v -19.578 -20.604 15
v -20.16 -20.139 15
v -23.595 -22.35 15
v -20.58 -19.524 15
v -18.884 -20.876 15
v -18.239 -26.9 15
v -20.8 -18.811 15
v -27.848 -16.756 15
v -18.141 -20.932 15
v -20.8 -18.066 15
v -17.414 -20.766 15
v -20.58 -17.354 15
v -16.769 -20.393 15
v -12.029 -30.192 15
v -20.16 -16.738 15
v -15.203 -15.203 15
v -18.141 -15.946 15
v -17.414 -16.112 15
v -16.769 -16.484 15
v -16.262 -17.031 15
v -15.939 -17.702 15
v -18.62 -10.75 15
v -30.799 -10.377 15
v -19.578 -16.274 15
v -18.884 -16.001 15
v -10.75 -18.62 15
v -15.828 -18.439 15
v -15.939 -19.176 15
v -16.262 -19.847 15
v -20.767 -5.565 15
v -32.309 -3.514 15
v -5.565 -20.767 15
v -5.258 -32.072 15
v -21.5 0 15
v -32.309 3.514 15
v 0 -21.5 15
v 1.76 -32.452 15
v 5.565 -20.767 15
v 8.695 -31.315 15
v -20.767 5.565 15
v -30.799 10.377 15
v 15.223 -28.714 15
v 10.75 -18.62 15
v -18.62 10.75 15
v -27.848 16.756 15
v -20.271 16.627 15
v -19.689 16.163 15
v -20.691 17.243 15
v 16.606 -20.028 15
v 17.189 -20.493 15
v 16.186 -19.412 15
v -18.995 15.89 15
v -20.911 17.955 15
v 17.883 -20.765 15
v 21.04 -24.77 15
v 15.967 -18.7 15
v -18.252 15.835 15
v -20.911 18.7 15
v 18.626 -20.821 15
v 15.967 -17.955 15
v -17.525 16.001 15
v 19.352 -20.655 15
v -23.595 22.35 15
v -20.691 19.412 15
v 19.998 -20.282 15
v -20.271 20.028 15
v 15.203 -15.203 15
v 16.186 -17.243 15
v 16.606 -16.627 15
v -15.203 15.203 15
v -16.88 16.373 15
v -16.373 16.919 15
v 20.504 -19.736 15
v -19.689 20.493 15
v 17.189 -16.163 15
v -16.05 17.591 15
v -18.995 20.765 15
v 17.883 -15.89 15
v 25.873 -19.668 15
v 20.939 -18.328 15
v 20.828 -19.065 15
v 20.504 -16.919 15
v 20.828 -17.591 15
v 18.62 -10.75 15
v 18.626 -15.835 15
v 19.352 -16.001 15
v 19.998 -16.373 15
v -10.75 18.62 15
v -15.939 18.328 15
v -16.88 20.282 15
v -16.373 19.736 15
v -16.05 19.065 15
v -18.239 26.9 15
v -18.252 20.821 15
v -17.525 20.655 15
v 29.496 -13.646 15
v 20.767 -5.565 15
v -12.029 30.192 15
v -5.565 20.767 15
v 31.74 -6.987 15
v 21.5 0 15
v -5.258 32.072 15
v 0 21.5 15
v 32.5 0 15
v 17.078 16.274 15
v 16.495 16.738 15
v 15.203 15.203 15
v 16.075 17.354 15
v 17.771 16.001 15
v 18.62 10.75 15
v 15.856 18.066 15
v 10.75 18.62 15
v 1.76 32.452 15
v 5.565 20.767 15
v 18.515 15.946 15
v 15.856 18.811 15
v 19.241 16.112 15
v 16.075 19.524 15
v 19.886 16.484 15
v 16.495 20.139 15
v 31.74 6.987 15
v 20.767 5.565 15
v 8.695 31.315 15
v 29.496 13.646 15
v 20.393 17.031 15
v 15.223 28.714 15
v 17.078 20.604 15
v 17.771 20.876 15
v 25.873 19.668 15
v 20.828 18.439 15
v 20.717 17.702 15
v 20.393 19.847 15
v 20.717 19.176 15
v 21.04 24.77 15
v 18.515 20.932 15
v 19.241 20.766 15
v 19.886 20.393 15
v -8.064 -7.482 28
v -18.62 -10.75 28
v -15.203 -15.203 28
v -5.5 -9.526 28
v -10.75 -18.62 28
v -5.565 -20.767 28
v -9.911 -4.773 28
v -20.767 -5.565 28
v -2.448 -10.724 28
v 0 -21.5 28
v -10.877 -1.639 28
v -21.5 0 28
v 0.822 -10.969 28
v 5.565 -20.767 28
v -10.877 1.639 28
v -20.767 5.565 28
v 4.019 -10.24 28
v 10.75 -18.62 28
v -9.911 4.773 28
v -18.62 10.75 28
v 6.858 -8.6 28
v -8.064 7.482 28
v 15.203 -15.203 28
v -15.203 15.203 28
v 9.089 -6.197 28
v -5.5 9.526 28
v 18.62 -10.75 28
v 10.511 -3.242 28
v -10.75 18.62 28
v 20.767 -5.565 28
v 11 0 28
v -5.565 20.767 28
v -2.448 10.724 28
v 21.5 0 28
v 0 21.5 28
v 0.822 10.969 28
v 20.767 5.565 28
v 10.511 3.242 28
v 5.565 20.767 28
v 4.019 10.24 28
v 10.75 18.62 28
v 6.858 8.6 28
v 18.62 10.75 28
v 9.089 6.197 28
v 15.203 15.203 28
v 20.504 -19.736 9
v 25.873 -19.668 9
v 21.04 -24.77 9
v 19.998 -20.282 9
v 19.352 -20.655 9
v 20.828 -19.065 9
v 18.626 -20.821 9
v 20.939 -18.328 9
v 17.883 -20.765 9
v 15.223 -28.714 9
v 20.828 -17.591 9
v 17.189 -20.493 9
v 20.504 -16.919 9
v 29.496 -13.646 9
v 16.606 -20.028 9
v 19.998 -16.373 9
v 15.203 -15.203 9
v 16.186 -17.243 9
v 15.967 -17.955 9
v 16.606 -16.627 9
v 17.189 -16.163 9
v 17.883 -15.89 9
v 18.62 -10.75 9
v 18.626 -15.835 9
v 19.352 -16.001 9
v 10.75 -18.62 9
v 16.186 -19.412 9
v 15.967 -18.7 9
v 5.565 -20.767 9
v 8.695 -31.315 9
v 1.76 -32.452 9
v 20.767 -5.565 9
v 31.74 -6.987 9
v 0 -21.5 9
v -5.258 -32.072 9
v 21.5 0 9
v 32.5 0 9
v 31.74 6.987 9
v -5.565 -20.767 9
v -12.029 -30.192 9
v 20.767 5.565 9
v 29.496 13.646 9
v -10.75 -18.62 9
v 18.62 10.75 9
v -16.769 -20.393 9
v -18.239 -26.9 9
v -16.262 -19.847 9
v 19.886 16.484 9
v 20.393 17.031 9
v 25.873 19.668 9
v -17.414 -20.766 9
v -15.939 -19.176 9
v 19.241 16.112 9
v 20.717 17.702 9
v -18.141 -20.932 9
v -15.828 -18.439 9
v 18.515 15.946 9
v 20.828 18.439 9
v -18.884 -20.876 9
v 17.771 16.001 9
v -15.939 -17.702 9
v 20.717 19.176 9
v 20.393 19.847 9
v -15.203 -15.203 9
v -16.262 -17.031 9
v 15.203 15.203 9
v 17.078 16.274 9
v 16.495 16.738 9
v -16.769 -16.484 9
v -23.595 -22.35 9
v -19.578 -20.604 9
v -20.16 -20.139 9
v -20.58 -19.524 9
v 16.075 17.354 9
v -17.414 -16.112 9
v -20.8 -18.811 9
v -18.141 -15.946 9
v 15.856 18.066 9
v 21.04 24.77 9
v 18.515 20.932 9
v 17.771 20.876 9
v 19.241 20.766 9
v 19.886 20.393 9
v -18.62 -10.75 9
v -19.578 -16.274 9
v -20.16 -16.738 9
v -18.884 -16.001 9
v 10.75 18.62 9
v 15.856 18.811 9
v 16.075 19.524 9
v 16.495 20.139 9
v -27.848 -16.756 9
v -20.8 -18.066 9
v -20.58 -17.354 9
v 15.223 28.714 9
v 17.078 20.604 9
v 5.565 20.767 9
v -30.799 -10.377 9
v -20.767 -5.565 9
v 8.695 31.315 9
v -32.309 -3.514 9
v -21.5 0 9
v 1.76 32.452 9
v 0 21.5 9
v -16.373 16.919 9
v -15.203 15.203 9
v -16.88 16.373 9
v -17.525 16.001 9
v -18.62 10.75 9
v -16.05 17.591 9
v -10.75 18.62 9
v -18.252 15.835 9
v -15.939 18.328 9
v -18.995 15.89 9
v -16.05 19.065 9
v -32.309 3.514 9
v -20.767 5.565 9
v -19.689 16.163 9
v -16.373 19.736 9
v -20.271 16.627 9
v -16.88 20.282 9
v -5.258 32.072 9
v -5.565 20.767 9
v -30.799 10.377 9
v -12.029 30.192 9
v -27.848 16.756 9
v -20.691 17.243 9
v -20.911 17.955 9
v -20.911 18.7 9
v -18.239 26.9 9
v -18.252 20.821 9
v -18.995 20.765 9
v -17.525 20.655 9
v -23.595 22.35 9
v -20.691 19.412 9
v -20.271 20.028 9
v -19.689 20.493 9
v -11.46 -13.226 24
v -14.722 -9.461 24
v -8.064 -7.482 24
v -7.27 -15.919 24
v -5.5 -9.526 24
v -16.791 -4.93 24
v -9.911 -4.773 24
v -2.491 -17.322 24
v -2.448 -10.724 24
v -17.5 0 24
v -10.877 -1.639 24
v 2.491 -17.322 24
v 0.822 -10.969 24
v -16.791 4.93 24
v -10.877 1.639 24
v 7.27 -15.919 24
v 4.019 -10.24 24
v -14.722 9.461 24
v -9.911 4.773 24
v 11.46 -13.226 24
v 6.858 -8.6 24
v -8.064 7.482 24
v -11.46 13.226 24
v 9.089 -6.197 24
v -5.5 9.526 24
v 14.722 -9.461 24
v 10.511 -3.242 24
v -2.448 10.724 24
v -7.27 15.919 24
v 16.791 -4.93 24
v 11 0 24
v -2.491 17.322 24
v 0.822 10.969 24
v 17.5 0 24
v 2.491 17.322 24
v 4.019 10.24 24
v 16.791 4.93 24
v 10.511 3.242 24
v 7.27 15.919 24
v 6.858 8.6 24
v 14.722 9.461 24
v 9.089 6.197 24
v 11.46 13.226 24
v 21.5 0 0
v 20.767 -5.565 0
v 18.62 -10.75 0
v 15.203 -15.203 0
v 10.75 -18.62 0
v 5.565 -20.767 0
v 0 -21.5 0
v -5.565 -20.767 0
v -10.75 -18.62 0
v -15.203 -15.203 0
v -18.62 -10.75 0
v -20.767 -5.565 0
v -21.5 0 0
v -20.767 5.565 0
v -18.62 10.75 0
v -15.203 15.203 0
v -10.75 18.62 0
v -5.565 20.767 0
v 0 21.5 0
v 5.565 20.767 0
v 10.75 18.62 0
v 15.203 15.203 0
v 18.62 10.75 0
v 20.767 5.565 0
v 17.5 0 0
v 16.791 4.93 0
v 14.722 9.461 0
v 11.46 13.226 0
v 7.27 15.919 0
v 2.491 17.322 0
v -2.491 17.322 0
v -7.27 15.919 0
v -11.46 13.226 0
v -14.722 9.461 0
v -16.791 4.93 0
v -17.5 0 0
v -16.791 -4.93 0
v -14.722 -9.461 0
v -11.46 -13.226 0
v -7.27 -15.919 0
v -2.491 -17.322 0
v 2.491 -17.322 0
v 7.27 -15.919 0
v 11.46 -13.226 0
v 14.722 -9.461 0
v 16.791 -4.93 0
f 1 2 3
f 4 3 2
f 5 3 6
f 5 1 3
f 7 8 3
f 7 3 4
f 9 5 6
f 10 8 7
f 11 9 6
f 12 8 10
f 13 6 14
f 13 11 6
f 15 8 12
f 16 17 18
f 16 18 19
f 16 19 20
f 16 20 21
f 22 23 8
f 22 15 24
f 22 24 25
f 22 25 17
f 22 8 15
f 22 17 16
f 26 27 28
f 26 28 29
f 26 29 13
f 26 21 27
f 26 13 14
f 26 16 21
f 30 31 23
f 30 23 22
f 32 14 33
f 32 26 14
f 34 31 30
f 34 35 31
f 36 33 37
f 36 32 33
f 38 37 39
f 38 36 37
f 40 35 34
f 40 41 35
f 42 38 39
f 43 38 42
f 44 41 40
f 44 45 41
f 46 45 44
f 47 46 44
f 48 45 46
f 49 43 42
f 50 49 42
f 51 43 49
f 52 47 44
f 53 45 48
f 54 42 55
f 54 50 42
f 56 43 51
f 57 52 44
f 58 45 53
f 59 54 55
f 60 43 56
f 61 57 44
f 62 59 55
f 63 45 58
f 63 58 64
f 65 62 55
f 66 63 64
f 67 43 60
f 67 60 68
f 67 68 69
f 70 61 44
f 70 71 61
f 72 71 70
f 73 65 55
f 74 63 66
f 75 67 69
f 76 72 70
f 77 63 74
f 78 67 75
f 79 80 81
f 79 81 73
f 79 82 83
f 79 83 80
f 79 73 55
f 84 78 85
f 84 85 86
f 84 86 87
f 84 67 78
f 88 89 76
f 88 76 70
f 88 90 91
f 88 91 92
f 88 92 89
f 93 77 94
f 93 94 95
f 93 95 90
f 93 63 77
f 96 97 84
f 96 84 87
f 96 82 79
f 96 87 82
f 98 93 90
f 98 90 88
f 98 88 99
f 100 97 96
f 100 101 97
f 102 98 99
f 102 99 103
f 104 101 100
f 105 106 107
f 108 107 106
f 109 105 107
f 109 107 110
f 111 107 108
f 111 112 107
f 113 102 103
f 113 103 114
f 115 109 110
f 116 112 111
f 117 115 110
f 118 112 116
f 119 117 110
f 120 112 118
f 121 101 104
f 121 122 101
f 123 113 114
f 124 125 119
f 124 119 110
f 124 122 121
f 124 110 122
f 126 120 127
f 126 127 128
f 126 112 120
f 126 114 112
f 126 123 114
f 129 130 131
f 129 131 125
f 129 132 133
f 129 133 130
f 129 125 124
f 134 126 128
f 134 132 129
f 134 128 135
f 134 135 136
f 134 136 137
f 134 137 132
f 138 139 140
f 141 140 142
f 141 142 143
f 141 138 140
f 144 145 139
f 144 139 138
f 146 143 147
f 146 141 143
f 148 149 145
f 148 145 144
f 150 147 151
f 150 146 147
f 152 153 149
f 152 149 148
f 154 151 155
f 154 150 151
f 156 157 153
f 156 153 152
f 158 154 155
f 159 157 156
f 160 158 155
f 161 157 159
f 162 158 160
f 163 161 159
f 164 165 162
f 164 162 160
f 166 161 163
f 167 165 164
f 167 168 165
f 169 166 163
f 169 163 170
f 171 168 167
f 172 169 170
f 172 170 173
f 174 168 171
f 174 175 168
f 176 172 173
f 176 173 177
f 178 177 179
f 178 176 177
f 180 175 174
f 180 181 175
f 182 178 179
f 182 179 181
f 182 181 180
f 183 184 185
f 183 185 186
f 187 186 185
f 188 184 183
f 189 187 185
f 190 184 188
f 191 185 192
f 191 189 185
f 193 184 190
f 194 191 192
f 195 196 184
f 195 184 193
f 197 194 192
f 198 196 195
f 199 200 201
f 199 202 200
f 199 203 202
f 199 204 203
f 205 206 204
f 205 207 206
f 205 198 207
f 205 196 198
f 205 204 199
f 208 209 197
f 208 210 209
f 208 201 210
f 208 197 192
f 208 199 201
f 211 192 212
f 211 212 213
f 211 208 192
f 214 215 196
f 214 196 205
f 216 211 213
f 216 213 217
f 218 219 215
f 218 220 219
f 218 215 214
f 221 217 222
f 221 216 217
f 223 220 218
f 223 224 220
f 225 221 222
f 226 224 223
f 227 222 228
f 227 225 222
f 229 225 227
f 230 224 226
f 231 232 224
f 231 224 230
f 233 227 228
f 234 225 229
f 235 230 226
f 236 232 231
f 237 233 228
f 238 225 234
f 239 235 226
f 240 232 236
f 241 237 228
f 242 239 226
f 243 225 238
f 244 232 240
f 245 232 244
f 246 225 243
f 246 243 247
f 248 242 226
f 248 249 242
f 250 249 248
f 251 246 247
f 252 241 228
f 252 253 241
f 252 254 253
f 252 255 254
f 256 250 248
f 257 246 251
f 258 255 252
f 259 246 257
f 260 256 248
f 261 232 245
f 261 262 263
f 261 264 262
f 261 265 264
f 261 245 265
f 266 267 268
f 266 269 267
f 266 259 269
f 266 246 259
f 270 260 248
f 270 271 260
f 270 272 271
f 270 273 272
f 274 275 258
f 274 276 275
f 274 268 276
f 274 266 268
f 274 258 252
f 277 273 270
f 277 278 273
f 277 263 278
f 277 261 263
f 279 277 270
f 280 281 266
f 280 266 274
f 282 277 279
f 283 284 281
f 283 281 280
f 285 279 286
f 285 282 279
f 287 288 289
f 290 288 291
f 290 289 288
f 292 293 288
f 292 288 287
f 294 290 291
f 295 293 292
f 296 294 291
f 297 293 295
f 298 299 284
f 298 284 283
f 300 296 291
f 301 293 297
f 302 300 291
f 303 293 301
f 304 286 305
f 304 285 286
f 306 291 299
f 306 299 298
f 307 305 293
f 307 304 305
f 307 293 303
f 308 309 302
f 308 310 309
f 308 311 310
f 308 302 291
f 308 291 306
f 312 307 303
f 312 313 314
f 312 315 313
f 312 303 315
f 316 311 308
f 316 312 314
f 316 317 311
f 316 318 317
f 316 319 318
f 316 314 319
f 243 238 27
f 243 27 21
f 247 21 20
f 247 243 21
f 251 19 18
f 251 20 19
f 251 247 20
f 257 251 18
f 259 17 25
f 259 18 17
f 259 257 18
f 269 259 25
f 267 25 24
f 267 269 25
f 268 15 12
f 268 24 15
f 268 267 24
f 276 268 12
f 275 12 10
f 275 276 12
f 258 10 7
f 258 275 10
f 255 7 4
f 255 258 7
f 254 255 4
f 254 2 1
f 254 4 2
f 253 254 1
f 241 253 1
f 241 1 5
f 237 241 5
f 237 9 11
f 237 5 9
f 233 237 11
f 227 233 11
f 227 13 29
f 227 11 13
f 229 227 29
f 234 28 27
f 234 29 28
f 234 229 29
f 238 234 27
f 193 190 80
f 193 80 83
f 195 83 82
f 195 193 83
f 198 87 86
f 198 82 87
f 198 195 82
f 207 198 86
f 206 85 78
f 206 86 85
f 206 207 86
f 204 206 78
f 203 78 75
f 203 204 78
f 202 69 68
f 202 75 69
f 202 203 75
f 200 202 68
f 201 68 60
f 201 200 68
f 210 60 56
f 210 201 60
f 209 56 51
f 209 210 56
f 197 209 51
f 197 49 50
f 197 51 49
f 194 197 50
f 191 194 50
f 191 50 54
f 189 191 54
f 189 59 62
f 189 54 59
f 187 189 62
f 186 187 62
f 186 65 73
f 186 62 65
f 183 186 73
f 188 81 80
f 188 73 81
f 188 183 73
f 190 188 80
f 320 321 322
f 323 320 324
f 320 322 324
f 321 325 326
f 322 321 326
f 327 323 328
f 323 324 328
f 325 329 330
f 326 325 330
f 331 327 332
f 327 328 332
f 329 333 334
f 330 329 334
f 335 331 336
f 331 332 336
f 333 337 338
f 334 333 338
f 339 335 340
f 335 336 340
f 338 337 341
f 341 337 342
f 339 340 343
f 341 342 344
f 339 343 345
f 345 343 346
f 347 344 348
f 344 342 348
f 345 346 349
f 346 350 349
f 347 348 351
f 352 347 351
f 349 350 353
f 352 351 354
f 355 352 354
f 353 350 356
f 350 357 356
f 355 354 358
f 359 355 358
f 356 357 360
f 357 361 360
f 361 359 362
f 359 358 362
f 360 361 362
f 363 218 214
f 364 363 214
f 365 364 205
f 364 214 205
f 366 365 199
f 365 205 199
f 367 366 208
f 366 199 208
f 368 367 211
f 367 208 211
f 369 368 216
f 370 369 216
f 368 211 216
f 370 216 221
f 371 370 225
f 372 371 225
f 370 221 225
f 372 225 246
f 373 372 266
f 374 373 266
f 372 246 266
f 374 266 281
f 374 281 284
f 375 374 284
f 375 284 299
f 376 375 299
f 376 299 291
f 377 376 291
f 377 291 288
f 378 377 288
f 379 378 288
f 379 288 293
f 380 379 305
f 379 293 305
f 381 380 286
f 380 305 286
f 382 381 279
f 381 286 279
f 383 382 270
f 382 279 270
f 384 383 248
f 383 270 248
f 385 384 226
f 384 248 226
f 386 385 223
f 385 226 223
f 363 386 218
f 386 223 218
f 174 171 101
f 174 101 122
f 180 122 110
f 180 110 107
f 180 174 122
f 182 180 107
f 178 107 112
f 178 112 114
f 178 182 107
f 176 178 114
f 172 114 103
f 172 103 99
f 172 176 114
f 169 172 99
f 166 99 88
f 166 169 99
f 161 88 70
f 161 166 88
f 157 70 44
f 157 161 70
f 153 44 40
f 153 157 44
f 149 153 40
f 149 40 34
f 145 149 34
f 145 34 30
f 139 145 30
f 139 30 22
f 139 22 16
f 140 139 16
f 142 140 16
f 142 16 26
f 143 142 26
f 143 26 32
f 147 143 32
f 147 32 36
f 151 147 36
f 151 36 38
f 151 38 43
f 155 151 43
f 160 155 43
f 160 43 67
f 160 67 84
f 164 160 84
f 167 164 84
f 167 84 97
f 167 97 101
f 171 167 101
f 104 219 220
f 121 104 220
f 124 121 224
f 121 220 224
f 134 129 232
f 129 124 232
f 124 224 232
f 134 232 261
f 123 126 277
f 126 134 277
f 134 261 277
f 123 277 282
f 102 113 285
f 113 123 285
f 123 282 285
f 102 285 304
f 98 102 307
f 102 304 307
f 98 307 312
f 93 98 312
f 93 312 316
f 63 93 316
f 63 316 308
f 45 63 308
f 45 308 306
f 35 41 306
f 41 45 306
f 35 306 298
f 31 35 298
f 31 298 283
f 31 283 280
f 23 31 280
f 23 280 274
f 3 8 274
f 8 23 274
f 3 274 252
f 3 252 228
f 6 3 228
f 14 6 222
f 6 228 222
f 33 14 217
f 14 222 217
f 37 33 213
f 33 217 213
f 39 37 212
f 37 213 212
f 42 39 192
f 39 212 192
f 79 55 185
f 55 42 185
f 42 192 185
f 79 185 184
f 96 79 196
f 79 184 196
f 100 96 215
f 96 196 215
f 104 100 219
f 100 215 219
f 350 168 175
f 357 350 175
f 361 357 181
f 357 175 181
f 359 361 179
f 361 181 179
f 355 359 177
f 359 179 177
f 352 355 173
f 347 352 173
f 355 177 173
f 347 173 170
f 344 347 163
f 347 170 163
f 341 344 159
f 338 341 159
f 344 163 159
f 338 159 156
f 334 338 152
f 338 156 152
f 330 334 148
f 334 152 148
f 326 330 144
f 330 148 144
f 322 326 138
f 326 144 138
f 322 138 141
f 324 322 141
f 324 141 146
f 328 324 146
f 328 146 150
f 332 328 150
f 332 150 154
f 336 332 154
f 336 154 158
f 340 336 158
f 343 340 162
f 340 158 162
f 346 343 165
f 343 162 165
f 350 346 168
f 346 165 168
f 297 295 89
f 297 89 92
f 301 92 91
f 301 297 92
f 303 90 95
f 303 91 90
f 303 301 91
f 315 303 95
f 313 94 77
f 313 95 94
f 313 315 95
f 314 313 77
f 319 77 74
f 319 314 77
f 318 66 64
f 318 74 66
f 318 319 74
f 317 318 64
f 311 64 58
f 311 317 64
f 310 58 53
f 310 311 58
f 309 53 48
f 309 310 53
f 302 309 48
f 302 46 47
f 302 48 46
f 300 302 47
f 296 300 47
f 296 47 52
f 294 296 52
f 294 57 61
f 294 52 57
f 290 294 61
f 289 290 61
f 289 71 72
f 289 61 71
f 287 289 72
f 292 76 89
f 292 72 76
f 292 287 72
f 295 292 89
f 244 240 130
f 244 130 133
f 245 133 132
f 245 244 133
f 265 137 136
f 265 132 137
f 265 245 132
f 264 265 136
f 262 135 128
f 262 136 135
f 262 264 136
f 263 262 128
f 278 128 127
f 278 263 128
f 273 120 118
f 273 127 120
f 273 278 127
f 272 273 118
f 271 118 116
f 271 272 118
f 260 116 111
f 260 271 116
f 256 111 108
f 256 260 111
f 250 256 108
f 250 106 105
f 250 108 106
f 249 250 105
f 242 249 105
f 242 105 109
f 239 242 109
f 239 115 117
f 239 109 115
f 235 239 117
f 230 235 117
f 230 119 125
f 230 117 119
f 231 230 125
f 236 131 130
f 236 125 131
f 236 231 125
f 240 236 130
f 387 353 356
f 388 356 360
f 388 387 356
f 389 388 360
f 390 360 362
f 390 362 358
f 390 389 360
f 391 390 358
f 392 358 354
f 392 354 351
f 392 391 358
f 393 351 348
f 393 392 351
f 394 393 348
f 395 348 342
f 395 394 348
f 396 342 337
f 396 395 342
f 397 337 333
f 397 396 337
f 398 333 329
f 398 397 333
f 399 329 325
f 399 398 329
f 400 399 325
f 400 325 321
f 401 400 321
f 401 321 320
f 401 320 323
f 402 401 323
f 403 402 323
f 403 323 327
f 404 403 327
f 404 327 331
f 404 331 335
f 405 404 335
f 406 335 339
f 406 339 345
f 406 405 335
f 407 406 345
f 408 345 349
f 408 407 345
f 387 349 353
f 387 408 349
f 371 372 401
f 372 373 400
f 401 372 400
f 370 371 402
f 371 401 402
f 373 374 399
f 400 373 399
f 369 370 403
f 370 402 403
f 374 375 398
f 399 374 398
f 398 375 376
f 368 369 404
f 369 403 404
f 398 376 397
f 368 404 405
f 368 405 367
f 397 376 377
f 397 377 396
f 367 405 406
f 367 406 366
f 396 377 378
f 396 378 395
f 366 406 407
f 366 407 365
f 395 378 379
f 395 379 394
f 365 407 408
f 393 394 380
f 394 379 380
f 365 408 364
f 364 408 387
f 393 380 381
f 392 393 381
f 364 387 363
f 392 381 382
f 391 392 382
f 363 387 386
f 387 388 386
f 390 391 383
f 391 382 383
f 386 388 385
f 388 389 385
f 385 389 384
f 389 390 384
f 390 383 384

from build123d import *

# Parameters (mm, degrees)
SKETCH_1_R          = 32.5
SKETCH_1_R_2        = 17.5
SKETCH_1_R_3        = 2.5
EXTRUDE_1_DEPTH     = 24
SKETCH_2_R          = 35
SKETCH_2_R_2        = 21.5
CUT_EXTRUDE_2_DEPTH = 9
CUT_EXTRUDE_START   = -9
SKETCH_3_R          = 35
SKETCH_3_R_2        = 21.5
CUT_EXTRUDE_3_DEPTH = 9
EXTRUDE_START       = 4
SKETCH_4_R          = 21.5
SKETCH_4_R_2        = 11
EXTRUDE_4_DEPTH     = 4


with BuildPart() as part:
    # Эскиз1 → Вытянуть1 (new body)
    with BuildSketch(Plane.XY):
        Circle(SKETCH_1_R)
        Circle(SKETCH_1_R_2, mode=Mode.SUBTRACT)
        with Locations((-18.438809137, 18.327731563)):
            Circle(SKETCH_1_R_3, mode=Mode.SUBTRACT)
        with Locations((18.327731563, 18.438809137)):
            Circle(SKETCH_1_R_3, mode=Mode.SUBTRACT)
        with Locations((18.438809137, -18.327731563)):
            Circle(SKETCH_1_R_3, mode=Mode.SUBTRACT)
        with Locations((-18.327731563, -18.438809137)):
            Circle(SKETCH_1_R_3, mode=Mode.SUBTRACT)
    extrude(amount=EXTRUDE_1_DEPTH)

    # Эскиз2 → Вытянуть2 (cut)
    with BuildSketch(Plane.XY.offset(24)):
        Circle(SKETCH_2_R)
        Circle(SKETCH_2_R_2, mode=Mode.SUBTRACT)
    extrude(amount=-CUT_EXTRUDE_2_DEPTH, mode=Mode.SUBTRACT)

    # Эскиз3 → Вытянуть3 (cut)
    with BuildSketch(Plane(origin=(0, 0, 0), x_dir=(-1, 0, 0), z_dir=(0, 0, -1)).offset(CUT_EXTRUDE_START)):
        Circle(SKETCH_3_R)
        with Locations(Location((0, 0, 0), (0, 0, 180))):
            Circle(SKETCH_3_R_2, mode=Mode.SUBTRACT)
    extrude(amount=CUT_EXTRUDE_3_DEPTH, mode=Mode.SUBTRACT)

    # Эскиз4 → Вытянуть4 (add)
    with BuildSketch(Plane.XY.offset(24).offset(EXTRUDE_START)):
        Circle(SKETCH_4_R)
        Circle(SKETCH_4_R_2, mode=Mode.SUBTRACT)
    extrude(amount=-EXTRUDE_4_DEPTH)


solid = part.part
